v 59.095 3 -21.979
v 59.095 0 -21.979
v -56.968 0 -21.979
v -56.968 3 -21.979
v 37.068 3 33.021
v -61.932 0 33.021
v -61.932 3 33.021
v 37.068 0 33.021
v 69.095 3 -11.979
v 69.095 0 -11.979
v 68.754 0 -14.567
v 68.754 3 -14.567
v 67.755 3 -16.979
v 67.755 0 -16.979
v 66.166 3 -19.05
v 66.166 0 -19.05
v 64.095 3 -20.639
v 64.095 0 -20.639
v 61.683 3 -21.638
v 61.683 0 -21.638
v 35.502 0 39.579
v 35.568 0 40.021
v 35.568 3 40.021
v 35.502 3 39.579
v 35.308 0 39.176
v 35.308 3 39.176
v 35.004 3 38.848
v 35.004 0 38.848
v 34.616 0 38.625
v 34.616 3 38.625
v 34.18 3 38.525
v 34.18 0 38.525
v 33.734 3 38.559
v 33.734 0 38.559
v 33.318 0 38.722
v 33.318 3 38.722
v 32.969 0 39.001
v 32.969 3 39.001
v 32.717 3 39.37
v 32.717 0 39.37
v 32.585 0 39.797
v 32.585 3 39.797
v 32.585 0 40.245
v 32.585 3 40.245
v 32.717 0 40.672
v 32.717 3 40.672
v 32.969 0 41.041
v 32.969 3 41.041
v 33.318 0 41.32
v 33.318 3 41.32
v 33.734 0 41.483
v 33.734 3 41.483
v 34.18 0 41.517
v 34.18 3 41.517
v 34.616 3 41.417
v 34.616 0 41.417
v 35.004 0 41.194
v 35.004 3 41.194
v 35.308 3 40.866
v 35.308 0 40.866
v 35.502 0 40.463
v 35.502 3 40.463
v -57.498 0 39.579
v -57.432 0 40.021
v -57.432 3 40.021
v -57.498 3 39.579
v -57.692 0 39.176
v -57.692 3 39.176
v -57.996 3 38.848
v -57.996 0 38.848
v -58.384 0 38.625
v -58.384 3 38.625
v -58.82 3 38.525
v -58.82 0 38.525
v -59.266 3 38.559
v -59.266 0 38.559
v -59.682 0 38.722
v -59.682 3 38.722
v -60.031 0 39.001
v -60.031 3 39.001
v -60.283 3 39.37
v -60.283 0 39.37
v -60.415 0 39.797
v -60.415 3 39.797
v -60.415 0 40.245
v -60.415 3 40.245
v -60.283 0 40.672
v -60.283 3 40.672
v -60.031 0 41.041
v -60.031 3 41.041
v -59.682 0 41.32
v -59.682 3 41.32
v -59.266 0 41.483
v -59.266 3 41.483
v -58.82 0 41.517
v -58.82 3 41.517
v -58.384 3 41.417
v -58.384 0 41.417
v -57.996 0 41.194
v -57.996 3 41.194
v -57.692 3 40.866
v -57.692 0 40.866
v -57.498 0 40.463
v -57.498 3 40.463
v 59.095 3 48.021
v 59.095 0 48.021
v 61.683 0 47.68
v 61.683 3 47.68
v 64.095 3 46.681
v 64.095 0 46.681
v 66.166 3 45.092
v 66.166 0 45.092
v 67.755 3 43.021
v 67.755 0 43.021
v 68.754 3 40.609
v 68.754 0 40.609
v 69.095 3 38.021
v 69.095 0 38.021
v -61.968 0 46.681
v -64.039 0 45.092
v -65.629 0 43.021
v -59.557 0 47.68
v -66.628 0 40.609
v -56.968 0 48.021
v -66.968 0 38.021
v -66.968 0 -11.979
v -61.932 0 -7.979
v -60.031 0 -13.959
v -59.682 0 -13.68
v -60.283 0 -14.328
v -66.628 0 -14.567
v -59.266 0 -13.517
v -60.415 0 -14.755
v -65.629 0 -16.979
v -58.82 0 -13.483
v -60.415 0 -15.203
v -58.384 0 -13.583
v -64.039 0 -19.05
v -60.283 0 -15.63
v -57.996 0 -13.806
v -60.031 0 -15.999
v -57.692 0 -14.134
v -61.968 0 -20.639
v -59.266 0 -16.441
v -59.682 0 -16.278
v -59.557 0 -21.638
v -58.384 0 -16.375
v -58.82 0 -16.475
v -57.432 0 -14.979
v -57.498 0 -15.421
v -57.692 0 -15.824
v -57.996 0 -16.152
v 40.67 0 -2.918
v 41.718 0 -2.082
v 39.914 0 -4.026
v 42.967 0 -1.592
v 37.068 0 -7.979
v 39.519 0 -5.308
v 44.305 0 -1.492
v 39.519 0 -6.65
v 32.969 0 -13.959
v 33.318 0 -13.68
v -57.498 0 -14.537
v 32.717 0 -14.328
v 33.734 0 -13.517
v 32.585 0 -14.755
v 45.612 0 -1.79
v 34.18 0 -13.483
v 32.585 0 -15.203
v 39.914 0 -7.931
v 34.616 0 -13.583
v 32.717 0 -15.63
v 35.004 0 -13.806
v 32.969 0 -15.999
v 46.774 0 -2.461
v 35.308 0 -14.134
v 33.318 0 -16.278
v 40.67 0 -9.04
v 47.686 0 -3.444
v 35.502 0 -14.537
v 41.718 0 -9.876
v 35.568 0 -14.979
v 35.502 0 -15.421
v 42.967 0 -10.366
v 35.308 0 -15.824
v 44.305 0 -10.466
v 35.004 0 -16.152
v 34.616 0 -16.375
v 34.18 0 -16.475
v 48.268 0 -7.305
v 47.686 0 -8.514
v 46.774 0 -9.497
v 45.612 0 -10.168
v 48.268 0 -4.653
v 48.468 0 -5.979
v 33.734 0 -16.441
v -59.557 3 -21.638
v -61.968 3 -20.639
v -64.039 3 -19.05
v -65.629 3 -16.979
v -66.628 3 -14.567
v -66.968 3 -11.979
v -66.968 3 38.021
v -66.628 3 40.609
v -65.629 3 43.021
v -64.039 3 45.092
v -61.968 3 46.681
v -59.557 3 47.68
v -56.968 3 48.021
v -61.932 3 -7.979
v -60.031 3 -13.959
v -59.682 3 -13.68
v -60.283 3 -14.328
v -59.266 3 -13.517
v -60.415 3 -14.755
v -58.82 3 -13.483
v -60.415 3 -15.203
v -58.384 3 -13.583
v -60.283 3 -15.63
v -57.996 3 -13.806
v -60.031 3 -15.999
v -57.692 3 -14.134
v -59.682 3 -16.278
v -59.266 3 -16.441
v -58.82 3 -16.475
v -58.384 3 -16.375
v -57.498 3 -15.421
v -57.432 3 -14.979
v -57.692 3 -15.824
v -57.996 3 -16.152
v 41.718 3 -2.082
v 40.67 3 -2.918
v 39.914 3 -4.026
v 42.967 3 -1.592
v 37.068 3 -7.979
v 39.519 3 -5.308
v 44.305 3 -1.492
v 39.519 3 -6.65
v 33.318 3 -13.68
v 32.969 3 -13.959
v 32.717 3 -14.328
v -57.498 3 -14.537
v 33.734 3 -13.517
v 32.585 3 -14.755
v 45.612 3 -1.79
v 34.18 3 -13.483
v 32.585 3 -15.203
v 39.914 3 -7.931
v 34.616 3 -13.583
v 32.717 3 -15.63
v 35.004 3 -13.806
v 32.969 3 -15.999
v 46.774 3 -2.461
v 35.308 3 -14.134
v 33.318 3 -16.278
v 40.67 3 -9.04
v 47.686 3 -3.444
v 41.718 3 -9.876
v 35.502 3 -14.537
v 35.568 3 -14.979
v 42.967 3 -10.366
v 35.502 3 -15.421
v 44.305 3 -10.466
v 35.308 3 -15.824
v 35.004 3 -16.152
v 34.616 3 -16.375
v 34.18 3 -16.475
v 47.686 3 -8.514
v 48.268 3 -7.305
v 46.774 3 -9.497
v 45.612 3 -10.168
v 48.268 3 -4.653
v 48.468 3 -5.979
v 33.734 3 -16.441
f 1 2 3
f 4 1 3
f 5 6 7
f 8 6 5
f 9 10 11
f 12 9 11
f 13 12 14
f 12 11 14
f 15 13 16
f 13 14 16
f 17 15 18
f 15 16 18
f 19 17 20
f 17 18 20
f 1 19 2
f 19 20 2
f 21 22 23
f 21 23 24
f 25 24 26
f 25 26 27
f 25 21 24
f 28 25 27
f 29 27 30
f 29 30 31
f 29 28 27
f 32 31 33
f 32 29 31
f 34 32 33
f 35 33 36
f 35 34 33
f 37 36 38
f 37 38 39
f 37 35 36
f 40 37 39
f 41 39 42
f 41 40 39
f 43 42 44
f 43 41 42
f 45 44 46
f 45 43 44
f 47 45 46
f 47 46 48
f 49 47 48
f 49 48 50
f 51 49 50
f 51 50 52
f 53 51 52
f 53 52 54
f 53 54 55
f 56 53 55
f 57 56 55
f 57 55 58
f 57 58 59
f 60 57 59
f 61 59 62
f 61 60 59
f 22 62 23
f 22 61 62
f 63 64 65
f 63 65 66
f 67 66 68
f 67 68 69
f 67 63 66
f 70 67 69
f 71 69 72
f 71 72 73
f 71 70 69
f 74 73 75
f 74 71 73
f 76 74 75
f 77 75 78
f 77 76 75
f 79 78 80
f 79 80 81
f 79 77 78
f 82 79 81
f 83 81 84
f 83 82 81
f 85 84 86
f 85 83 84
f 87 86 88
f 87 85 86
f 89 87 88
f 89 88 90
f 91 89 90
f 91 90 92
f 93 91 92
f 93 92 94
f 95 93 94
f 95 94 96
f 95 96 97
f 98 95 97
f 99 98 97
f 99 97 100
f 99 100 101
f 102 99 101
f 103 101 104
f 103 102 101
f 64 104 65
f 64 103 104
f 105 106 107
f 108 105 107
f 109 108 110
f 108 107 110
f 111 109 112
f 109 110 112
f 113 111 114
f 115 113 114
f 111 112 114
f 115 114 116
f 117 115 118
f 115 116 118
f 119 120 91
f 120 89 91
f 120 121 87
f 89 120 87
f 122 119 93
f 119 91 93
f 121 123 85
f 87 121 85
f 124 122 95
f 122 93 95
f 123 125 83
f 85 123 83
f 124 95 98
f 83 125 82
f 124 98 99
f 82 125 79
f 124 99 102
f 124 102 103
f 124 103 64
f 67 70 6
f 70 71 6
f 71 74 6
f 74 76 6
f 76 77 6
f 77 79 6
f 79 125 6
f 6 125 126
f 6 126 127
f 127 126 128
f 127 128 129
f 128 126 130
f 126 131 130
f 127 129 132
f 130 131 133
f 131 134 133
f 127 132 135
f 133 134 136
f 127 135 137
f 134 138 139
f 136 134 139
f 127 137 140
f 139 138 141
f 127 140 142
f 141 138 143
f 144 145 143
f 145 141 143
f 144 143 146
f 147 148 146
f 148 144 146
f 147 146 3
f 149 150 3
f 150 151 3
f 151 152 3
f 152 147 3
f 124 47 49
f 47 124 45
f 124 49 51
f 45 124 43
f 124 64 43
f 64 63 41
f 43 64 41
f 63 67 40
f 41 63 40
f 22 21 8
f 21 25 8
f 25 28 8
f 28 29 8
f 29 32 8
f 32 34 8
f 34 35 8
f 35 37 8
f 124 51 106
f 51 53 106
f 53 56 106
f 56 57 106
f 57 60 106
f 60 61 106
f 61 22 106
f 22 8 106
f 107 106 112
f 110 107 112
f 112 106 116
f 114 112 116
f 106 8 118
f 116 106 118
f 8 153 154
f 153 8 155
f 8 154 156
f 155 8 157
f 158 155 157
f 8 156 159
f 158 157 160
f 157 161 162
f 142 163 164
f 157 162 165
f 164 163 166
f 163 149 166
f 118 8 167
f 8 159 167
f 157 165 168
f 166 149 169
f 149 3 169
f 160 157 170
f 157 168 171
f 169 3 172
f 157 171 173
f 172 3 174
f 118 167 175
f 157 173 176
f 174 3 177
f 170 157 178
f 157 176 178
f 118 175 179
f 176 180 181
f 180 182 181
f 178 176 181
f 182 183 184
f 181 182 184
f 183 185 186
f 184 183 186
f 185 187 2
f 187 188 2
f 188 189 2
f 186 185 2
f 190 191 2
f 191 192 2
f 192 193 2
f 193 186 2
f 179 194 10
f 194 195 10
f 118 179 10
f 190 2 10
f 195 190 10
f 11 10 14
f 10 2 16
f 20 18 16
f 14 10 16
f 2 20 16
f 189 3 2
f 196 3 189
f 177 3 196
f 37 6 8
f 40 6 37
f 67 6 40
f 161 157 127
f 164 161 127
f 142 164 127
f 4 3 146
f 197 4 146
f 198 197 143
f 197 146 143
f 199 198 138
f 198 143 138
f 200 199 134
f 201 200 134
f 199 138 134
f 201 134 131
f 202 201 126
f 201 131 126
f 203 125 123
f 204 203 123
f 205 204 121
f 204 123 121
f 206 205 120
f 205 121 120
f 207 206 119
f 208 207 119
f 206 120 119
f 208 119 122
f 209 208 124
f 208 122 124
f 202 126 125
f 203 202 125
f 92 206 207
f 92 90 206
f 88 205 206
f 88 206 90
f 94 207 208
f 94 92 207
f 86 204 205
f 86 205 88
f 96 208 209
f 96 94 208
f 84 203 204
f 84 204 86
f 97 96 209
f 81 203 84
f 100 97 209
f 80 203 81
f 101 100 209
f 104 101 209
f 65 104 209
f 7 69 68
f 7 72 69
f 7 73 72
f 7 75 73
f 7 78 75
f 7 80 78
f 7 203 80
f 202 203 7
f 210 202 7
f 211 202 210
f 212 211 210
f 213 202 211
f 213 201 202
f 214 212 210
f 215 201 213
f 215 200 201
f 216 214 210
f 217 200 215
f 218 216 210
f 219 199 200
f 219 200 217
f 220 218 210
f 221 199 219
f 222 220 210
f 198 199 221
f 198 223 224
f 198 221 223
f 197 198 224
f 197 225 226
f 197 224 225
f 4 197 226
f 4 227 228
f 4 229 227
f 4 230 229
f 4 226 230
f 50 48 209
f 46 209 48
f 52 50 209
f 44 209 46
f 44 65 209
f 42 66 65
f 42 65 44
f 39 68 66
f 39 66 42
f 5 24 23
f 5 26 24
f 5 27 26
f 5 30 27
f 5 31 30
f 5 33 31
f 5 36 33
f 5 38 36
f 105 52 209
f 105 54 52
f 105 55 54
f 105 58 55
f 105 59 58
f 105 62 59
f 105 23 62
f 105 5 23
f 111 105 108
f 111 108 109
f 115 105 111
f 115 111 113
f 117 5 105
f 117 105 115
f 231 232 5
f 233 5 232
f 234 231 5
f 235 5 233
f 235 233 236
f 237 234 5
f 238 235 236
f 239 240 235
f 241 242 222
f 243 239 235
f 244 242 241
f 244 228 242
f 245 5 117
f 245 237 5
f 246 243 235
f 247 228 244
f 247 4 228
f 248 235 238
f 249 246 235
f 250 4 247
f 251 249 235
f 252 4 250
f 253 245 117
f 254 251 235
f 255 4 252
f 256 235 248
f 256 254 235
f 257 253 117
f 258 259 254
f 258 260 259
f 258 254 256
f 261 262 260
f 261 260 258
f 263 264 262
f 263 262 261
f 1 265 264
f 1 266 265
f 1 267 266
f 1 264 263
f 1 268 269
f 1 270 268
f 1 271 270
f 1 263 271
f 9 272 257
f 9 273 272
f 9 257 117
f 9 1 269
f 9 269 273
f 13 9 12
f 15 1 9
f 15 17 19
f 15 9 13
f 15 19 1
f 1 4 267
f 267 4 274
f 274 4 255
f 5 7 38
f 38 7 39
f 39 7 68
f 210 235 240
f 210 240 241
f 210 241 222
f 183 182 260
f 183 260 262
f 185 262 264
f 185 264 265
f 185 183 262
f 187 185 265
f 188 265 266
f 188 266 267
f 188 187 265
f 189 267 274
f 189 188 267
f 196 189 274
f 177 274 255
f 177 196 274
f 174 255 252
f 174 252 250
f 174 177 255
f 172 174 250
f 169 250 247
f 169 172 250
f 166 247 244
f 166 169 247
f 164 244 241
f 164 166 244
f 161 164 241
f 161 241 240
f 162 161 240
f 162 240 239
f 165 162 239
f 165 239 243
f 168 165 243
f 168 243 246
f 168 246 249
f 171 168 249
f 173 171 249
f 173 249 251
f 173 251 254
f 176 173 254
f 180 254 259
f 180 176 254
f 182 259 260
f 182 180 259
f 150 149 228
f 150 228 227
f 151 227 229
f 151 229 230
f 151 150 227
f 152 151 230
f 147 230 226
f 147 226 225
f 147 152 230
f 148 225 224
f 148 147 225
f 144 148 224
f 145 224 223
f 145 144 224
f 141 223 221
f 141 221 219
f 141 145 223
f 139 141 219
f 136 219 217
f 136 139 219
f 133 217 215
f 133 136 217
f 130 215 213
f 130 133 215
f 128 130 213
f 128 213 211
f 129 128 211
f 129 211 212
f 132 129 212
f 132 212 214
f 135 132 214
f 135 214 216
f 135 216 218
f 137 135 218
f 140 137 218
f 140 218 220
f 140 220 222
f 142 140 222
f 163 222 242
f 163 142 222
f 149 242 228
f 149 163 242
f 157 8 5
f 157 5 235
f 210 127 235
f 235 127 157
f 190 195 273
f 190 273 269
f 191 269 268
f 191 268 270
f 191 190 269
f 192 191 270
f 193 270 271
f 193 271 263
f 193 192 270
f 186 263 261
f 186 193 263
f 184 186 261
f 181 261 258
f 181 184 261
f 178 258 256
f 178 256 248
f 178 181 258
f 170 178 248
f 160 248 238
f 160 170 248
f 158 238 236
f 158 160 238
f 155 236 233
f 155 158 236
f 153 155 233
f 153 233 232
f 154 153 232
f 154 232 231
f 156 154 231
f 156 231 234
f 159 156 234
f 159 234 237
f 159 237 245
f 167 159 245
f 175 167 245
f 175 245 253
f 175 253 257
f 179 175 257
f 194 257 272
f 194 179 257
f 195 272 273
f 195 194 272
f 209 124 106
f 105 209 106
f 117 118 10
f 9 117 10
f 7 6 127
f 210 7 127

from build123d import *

# Parameters (mm, degrees)
SKETCH1_R           = 1.5
SKETCH1_R_2         = 4.5
SKETCH1_W           = 99
SKETCH1_H           = 41
BOSS_EXTRUDE1_DEPTH = 3


with BuildPart() as part:
    # Sketch1 → Boss-Extrude1 (new body)
    with BuildSketch(Plane(origin=(0, 0, 0), x_dir=(1, 0, 0), z_dir=(0, 1, 0))):
        with BuildLine():
            Line((69.094938721, -38.021047238), (69.094938721, 11.978952762))
            ThreePointArc((69.094938721, 11.978952762), (66.166006532, 19.050020574), (59.094938721, 21.978952762))
            Line((59.094938721, 21.978952762), (-56.968320128, 21.978952762))
            ThreePointArc((-56.968320128, 21.978952762), (-64.039387939, 19.050020574), (-66.968320128, 11.978952762))
            Line((-66.968320128, 11.978952762), (-66.968320128, -38.021047238))
            ThreePointArc((-66.968320128, -38.021047238), (-64.039387939, -45.09211505), (-56.968320128, -48.021047238))
            Line((-56.968320128, -48.021047238), (59.094938721, -48.021047238))
            ThreePointArc((59.094938721, -48.021047238), (66.166006532, -45.09211505), (69.094938721, -38.021047238))
        make_face()
        with Locations((-58.93171984, 14.978952762)):
            Circle(SKETCH1_R, mode=Mode.SUBTRACT)
        with Locations((34.06828016, 14.978952762)):
            Circle(SKETCH1_R, mode=Mode.SUBTRACT)
        with Locations((-58.93171984, -40.021047238)):
            Circle(SKETCH1_R, mode=Mode.SUBTRACT)
        with Locations((34.06828016, -40.021047238)):
            Circle(SKETCH1_R, mode=Mode.SUBTRACT)
        with Locations((43.96828016, 5.978952762)):
            Circle(SKETCH1_R_2, mode=Mode.SUBTRACT)
        with Locations((-12.43171984, -12.521047238)):
            Rectangle(SKETCH1_W, SKETCH1_H, mode=Mode.SUBTRACT)
    extrude(amount=BOSS_EXTRUDE1_DEPTH)


solid = part.part
